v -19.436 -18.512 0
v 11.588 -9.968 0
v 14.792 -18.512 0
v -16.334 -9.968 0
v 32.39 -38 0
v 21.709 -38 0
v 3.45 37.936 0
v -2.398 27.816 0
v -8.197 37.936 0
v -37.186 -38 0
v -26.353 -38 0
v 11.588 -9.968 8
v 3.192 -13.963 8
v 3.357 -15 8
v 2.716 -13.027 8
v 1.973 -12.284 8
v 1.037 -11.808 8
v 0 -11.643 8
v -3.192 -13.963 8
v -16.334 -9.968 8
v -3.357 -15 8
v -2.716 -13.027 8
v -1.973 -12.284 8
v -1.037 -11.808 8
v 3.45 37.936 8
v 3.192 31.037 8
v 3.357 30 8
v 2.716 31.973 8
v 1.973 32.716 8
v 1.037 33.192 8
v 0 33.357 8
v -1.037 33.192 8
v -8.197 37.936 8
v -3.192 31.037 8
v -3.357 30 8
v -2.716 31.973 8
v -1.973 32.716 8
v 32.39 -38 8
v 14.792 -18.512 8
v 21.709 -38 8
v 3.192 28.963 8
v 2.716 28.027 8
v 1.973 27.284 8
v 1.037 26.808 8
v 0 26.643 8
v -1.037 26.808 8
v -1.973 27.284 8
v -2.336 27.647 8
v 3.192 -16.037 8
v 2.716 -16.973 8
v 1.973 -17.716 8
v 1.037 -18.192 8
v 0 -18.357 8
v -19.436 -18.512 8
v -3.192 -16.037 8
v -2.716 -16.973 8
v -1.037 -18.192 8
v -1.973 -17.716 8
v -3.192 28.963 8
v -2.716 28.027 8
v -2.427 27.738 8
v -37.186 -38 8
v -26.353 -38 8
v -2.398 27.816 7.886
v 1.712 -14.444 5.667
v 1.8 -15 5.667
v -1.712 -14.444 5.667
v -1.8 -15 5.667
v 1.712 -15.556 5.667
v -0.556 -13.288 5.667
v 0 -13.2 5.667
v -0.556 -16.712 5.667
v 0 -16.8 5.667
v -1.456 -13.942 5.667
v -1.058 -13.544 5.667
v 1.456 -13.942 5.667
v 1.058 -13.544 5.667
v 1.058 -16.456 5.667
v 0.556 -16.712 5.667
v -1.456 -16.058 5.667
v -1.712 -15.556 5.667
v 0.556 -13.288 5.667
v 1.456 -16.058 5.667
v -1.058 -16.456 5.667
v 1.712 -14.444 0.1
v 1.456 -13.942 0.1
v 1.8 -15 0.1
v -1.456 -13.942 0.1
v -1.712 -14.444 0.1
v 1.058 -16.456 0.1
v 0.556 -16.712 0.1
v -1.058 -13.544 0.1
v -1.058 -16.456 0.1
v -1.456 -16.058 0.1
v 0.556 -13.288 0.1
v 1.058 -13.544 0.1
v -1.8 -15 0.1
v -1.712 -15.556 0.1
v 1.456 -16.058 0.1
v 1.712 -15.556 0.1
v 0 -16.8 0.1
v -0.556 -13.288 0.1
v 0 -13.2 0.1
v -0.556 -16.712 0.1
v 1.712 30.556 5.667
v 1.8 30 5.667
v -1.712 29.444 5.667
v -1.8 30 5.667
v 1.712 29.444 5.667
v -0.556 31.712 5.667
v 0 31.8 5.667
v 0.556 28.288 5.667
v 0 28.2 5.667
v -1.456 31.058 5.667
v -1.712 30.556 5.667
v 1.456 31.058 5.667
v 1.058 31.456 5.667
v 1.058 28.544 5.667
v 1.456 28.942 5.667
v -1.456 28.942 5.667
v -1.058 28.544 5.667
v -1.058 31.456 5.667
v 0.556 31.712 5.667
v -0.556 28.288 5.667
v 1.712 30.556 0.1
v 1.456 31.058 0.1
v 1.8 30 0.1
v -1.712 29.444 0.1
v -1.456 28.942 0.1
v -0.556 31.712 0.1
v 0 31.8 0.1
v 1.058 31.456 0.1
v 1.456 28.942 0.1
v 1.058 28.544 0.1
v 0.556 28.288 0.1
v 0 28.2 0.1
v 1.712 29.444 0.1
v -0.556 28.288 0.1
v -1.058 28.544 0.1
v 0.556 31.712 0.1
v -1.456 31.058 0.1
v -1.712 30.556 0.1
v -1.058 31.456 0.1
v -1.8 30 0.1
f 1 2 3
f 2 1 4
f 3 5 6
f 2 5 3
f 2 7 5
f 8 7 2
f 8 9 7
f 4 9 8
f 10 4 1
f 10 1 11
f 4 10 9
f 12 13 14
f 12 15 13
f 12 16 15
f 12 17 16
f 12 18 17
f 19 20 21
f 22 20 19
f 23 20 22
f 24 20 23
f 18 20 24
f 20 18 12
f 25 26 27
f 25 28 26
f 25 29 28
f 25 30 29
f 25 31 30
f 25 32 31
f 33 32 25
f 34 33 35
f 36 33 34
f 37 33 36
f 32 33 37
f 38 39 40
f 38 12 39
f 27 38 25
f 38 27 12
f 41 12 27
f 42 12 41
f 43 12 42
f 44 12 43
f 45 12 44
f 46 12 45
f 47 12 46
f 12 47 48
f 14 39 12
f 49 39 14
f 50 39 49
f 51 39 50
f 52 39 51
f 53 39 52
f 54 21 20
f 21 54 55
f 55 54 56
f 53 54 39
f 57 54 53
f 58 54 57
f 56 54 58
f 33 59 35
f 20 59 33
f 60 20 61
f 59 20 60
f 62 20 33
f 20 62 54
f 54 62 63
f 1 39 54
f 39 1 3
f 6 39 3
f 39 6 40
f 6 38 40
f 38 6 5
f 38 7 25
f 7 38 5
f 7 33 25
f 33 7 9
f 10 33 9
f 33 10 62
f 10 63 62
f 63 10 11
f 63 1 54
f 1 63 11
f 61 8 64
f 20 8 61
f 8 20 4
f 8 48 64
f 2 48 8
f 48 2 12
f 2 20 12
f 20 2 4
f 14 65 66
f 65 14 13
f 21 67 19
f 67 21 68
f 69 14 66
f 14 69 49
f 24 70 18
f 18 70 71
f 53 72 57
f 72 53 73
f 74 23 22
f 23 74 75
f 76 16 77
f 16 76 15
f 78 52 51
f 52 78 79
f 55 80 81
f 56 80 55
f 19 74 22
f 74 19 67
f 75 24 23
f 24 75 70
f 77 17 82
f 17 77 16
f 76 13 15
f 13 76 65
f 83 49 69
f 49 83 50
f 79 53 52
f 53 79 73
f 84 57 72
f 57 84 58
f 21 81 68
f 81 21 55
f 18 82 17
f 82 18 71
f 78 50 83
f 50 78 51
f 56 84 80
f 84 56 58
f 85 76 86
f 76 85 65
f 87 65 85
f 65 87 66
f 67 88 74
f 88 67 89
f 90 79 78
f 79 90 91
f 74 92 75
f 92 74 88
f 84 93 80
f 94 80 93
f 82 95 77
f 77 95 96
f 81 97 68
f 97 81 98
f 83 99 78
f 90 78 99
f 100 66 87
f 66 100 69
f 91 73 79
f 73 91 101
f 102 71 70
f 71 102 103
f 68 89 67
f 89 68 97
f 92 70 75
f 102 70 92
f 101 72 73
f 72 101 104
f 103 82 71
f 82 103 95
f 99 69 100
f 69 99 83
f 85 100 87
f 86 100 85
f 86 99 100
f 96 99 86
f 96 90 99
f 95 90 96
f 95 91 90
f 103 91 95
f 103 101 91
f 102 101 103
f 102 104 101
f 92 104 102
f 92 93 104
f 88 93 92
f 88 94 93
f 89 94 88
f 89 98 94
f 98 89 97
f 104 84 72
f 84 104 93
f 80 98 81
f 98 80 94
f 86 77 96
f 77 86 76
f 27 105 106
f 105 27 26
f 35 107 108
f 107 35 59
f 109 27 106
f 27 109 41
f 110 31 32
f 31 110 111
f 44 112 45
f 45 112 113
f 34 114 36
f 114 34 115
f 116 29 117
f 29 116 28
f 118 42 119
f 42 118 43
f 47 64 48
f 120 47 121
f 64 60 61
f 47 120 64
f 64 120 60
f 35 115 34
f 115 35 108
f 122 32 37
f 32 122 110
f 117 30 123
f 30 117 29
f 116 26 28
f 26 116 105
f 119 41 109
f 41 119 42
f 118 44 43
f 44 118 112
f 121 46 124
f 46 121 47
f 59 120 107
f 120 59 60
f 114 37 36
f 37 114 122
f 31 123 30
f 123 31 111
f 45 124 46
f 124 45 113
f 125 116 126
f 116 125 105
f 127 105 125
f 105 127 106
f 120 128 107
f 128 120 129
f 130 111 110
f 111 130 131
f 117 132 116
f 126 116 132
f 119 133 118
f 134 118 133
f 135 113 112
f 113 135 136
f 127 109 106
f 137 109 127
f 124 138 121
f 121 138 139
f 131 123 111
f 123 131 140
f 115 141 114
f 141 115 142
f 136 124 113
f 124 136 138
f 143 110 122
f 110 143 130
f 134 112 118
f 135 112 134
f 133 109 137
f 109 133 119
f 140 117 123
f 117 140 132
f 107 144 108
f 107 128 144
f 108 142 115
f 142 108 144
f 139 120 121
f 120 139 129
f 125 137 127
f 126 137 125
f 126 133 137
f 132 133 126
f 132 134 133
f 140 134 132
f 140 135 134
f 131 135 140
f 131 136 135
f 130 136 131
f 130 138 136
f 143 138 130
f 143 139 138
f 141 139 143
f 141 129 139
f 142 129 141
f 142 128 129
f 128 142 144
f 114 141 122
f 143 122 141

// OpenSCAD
// Street Numbers for 3D printing
// Charles Tilford, 2019
// License: CC BY-NC-SA 4.0
//   https://creativecommons.org/licenses/by-nc-sa/4.0/

char="A";     // The number/letter to print

// Units are in mm, except for height of letter

// How many inches high should letter be?
inchesHigh=3;
// How thick/deep should letter be (mm)?
depth=8;

// Character coordinates just center the letter
charX=-38;    // Character X coord
charY=-38;    // Character Y coord
topScrew=30;  // Top screw Y coord
botScrew=-15; // Bottom screw Y coord
height=8;     // Thickness of character
// Screw dimensions. Default presumes
// #6 sheet metal screw
screwWid=3.6; // Width of screw shaft
screwTop=6.78;// Width of screw head
screwCon=5.08;// Height of head 'cone'

// Font to print in. Your system needs this
// installed, of course. If changed the hole
// positions almost certainly need to be
// changed, and maybe charX/charY.
fName="Open Sans Extrabold";
// https://fonts.google.com/specimen/Open+Sans
// Designer: Steve Matteson

// Thin floor below holes. My printer was
// struggling to have the hole 'border' stick
// to the stage. Just drill/screw thru it.
holeFloor=0.1; 

// ==========================================
// ===== All values below are auto-calculated
// ==========================================

// Scaled values
scaleFactor=inchesHigh / 3;
cX=charX * scaleFactor;
cY=charY * scaleFactor;
tS=topScrew * scaleFactor;
bS=botScrew * scaleFactor;
// Where do we start drawing screw head cone?
oS=depth - (screwCon-.05);

difference() {
  // We use difference() to punch out the screw holes
  // in the character
    
  // The character itself, 8mm thick
  translate([cX,cY,0])
    linear_extrude(height=depth, scale=1)
    text(char, size=(75*scaleFactor),
         $fn=100, font=fName);
    
  // Bottom screw hole
  translate([0,bS,oS]) color("red")
    cylinder(h=screwCon, d2=screwTop,
             d1=0, $fn=20);
   translate([0,bS,holeFloor])
    cylinder(h=20, d=screwWid, $fn=20);
    
  // Top screw hole
  translate([0,tS,oS]) color("red")
    cylinder(h=screwCon, d2=screwTop,
             d1=0, $fn=20);
  translate([0,tS,holeFloor])
    cylinder(h=20, d=screwWid, $fn=20);
}

// Colors are just to aid visualization of
// void spaces. $fn is "featuer number", ie how
// many polygons are devoted to object. The values
// above should be near your printing limit anyway.

// Developed in OpenSCAD
//    https://www.openscad.org/
